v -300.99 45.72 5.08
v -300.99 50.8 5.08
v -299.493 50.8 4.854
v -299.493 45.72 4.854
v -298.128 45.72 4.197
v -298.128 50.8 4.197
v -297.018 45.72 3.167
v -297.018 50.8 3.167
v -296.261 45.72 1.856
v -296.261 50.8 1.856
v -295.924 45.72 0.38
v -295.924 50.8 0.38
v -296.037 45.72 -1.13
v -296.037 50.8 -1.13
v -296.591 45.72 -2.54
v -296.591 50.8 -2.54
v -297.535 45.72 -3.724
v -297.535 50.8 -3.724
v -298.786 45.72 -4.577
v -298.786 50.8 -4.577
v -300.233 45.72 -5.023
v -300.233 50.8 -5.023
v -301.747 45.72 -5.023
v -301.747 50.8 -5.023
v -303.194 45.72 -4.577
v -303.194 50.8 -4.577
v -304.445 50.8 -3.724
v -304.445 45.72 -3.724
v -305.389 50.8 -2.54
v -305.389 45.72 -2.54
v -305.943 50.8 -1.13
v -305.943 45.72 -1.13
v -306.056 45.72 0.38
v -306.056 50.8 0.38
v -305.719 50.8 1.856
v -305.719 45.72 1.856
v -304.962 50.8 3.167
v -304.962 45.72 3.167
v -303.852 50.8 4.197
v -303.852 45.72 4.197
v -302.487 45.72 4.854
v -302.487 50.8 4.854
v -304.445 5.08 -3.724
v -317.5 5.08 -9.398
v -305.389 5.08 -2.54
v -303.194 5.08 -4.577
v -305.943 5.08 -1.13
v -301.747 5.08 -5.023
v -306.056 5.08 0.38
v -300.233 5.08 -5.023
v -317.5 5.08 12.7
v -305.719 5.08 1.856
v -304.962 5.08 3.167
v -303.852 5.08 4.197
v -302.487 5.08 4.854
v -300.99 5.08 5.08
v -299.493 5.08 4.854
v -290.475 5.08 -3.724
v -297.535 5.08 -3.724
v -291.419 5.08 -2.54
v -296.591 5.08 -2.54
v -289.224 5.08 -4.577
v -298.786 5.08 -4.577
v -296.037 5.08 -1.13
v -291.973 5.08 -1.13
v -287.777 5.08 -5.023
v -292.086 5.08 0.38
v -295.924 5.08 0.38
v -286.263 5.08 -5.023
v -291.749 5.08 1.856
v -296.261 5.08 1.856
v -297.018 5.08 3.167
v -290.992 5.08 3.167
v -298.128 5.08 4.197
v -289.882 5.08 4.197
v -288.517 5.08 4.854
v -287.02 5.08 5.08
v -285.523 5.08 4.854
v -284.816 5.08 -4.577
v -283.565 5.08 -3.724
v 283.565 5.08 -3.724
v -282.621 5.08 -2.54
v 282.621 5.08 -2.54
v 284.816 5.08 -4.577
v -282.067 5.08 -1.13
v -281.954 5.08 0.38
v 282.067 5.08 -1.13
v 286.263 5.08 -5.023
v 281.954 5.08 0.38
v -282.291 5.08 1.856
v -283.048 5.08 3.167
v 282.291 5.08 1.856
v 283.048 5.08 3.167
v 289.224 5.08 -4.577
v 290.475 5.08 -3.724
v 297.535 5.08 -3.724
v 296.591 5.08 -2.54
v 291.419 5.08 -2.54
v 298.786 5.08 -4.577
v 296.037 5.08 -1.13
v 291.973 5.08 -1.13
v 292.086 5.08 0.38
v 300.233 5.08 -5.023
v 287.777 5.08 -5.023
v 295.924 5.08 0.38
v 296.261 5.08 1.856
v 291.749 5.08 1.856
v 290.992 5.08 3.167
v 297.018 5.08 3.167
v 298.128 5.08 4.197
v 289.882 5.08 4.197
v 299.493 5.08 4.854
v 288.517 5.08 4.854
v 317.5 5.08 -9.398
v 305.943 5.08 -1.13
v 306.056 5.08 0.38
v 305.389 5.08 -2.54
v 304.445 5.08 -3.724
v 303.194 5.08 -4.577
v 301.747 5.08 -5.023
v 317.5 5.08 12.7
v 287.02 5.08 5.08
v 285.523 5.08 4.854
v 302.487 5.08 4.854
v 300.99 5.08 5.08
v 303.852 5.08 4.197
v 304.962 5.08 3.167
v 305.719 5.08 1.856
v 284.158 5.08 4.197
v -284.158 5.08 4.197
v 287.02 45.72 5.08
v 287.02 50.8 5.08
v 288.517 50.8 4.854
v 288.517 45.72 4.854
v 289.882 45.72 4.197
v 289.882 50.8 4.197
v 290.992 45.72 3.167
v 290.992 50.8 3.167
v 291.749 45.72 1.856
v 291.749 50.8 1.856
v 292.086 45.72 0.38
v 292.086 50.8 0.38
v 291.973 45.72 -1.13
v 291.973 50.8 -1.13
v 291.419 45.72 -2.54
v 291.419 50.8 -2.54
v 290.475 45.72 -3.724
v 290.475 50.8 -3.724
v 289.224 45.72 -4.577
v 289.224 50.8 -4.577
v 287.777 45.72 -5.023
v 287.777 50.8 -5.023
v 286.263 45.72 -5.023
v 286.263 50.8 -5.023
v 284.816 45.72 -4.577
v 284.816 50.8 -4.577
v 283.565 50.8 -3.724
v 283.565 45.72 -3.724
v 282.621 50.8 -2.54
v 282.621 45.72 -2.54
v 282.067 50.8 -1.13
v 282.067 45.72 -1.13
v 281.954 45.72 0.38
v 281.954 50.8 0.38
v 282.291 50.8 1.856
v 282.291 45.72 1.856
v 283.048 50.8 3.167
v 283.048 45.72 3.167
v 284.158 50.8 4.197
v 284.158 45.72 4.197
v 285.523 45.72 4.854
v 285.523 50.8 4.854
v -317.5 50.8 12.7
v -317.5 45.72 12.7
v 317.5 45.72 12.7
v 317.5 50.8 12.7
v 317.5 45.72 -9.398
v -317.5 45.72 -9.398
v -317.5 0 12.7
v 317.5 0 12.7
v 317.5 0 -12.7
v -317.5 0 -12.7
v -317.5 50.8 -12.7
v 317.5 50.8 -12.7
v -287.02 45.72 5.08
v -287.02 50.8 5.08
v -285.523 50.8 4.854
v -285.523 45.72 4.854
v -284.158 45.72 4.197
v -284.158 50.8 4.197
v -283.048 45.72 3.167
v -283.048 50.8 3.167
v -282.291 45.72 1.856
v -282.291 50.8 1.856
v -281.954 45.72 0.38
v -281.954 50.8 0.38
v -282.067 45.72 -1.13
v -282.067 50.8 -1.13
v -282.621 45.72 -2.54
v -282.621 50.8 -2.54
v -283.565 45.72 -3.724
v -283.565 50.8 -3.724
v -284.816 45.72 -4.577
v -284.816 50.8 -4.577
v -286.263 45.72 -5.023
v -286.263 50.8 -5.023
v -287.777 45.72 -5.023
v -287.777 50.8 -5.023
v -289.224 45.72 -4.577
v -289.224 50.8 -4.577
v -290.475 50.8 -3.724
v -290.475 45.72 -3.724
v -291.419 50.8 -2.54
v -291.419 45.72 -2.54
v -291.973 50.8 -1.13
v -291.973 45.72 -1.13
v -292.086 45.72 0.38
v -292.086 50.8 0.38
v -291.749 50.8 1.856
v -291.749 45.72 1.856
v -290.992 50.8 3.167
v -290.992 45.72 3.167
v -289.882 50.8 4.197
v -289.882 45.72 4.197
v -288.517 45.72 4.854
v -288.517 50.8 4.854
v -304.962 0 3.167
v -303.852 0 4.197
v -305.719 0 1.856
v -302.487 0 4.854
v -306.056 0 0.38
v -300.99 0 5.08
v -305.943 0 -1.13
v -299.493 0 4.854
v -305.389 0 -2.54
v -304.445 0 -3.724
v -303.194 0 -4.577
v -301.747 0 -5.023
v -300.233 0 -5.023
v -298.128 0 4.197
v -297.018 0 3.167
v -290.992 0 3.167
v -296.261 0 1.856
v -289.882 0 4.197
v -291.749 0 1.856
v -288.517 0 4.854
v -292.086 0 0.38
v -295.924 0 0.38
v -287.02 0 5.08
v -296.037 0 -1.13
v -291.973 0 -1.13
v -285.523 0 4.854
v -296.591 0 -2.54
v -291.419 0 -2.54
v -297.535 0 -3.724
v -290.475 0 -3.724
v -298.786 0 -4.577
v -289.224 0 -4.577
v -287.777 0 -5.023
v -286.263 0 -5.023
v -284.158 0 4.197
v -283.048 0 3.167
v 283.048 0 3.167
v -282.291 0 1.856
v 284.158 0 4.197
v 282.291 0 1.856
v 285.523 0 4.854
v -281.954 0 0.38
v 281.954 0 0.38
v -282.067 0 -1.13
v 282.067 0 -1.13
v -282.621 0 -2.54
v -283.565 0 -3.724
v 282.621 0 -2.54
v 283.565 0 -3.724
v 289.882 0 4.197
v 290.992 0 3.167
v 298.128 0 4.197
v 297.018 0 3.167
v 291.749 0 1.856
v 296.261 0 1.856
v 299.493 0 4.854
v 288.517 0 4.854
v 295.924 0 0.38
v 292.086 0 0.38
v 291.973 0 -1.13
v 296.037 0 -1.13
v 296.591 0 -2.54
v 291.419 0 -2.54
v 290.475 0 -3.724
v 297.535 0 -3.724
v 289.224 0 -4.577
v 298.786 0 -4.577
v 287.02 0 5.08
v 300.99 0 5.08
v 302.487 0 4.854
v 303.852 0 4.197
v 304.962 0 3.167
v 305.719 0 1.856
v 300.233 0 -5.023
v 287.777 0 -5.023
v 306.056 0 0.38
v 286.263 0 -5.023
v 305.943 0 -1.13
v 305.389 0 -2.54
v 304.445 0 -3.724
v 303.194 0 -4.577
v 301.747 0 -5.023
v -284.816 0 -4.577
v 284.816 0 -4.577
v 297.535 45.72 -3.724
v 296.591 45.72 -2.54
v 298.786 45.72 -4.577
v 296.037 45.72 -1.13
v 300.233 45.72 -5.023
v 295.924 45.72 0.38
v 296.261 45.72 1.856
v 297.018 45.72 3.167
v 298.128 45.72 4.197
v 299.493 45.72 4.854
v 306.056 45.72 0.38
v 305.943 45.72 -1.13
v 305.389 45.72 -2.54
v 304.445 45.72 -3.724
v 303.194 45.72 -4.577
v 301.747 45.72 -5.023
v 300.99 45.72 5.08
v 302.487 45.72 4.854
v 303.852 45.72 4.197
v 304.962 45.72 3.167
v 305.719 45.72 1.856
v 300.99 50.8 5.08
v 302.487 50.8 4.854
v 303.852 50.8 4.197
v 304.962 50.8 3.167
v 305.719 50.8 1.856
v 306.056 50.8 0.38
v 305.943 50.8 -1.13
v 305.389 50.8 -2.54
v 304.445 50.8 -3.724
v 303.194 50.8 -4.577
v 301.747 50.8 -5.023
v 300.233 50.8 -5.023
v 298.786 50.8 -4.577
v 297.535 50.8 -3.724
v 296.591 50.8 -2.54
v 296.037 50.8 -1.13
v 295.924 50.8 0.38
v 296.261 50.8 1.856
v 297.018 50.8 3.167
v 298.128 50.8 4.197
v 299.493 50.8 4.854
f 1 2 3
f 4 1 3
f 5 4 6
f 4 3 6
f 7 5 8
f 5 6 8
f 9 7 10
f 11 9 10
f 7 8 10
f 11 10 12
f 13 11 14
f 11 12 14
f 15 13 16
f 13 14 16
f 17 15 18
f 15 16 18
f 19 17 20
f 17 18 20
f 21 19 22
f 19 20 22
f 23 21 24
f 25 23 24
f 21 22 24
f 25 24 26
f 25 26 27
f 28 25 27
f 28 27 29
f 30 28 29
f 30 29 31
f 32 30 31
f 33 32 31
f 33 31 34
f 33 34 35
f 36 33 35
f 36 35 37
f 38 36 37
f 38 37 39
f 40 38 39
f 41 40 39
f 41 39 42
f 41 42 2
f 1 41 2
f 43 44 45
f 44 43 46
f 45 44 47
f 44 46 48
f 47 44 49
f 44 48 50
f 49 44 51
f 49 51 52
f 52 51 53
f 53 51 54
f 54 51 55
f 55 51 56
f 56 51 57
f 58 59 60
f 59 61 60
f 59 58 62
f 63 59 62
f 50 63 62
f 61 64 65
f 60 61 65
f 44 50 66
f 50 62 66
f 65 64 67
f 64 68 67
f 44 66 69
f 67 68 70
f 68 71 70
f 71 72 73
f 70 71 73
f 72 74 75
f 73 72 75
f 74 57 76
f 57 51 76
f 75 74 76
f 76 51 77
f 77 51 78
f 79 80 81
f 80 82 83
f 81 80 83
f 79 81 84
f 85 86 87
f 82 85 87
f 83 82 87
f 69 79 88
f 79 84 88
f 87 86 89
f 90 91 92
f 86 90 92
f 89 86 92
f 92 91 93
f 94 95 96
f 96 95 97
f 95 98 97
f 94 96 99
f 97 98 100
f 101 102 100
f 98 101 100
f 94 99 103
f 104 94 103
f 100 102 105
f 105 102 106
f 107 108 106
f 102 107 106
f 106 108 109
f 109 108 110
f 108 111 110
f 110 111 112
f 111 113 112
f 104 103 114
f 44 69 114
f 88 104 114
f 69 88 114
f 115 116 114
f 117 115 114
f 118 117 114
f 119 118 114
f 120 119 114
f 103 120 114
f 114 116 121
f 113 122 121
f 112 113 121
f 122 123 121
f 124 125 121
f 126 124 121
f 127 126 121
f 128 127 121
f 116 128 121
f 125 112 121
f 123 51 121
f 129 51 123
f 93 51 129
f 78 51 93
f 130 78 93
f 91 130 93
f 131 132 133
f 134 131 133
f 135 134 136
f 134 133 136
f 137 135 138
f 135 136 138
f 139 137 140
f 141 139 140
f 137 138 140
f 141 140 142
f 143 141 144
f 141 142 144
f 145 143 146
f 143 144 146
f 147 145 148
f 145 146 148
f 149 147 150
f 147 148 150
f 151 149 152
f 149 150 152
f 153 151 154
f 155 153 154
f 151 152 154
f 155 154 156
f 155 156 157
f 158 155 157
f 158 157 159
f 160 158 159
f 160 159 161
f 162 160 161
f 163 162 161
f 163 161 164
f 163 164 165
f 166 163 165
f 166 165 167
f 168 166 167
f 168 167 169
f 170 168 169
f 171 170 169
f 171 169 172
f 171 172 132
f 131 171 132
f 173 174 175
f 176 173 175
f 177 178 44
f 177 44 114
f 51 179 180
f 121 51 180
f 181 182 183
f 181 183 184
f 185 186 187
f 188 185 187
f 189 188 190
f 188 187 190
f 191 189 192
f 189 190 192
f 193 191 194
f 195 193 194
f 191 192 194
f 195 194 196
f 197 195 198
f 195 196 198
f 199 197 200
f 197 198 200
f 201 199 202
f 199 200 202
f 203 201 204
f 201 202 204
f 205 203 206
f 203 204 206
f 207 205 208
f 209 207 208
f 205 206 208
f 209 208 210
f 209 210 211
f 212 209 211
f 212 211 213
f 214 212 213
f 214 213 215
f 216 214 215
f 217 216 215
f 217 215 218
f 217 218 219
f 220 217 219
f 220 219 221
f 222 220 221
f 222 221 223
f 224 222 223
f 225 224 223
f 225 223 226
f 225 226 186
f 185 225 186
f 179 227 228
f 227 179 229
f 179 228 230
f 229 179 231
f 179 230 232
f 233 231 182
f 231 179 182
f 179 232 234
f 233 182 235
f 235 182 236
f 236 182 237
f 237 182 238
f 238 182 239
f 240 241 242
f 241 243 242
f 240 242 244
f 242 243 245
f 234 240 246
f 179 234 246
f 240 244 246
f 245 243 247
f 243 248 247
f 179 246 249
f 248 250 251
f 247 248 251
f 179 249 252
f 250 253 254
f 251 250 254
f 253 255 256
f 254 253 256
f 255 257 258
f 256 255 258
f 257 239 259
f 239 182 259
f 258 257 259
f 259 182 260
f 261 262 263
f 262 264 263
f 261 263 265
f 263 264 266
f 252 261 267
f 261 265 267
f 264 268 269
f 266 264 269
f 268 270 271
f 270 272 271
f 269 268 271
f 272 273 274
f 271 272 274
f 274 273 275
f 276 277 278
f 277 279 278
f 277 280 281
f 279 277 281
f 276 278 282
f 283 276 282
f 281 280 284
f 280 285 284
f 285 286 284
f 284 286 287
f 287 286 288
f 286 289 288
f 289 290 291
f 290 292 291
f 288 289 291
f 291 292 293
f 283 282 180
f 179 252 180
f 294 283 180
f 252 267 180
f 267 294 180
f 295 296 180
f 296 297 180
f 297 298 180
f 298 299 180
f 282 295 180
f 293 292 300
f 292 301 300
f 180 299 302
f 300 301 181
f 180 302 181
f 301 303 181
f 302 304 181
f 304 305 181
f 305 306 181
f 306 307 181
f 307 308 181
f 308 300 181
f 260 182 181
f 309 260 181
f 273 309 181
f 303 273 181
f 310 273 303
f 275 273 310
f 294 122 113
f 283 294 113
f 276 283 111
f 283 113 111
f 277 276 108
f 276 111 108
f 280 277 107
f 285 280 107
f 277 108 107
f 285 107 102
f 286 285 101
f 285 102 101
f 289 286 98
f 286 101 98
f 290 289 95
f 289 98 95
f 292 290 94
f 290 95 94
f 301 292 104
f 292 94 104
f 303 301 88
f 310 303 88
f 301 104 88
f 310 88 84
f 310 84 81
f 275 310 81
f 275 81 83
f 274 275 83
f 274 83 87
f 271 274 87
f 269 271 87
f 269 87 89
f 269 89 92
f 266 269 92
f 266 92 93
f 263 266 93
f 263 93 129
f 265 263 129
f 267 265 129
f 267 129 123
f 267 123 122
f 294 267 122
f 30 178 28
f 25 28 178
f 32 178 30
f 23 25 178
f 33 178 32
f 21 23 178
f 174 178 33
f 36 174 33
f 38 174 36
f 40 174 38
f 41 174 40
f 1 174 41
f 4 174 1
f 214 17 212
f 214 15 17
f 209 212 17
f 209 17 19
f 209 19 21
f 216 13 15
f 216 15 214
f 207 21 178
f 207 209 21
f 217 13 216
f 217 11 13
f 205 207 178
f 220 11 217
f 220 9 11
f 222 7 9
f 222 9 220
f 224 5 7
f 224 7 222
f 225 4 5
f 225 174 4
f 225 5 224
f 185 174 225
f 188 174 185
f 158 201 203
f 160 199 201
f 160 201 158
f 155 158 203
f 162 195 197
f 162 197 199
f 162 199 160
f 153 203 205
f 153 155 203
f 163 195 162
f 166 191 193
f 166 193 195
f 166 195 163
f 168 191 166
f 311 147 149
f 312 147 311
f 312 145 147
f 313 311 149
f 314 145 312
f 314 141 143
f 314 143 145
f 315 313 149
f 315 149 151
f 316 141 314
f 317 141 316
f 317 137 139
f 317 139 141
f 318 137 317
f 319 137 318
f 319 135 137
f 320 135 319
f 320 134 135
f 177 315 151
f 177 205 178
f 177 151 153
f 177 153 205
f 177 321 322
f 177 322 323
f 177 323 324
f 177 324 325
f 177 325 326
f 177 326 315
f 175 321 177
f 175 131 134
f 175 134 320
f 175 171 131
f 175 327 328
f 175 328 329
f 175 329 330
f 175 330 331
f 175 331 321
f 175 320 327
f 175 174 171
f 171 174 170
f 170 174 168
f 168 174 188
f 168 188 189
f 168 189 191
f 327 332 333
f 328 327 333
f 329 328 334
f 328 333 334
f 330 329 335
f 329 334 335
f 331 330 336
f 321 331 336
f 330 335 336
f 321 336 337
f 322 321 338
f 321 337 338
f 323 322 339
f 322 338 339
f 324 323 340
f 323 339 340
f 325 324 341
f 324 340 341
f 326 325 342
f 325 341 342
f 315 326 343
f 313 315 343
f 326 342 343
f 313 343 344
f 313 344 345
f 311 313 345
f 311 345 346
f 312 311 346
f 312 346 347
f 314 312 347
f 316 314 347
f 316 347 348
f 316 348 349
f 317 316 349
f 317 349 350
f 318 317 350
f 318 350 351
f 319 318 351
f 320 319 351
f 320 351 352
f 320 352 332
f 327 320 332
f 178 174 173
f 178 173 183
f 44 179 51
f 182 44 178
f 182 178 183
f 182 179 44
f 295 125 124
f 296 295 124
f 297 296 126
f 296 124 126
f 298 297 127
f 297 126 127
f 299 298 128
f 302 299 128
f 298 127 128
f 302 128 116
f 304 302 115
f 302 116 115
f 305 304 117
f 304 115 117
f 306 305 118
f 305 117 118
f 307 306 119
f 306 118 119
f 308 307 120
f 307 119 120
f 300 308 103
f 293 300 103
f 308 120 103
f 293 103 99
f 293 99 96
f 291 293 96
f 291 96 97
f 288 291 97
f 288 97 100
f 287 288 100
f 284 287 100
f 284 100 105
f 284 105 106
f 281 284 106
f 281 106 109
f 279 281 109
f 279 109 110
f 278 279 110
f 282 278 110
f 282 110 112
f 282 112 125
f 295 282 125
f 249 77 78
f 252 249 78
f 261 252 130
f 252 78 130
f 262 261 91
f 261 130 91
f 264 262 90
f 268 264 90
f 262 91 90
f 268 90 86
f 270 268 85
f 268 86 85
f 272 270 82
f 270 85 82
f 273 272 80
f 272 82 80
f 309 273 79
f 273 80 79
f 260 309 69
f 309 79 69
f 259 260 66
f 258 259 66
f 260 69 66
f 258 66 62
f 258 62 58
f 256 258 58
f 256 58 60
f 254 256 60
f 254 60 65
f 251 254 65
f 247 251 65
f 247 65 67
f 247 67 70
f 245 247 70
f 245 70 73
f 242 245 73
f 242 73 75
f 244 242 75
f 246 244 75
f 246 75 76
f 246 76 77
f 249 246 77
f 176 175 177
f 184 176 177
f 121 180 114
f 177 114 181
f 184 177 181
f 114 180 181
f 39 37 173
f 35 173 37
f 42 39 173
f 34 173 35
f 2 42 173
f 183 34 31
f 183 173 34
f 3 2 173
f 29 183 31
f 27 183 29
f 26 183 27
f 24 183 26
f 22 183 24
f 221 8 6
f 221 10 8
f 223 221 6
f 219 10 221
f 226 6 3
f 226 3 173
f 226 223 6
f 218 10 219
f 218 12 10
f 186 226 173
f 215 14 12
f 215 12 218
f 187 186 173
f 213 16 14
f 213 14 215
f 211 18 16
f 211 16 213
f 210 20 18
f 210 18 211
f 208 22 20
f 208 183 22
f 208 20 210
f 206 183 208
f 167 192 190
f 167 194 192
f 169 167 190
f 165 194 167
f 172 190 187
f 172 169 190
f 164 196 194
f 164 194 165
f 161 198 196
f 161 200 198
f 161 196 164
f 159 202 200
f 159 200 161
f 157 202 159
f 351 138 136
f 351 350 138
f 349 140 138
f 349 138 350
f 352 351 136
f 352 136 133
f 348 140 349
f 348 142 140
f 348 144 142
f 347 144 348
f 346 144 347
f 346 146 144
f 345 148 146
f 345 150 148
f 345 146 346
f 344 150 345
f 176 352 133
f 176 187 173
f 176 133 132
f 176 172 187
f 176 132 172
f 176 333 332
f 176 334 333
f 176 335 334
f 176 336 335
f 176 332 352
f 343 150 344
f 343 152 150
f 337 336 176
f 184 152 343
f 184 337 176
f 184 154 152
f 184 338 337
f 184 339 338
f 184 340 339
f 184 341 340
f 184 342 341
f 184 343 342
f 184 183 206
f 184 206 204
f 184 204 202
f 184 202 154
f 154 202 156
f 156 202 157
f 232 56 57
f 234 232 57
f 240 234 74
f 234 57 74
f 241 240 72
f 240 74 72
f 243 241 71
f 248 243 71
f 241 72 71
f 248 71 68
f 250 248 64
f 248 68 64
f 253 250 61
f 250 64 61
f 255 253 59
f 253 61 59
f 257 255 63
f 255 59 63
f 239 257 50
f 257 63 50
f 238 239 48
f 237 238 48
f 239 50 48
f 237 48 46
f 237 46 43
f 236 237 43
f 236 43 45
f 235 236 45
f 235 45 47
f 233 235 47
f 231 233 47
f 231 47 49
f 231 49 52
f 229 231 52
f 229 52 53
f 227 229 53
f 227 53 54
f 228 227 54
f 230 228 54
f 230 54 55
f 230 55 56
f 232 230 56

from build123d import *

# Parameters (mm, degrees)
SKETCH1_W           = 635
SKETCH1_H           = 25.4
BOSS_EXTRUDE1_DEPTH = 50.8
SKETCH2_R           = 5.08
CUT_EXTRUDE1_DEPTH  = 53.34
SKETCH3_W           = 635
SKETCH3_H           = 40.64
CUT_EXTRUDE2_DEPTH  = 22.098


with BuildPart() as part:
    # Sketch1 → Boss-Extrude1 (new body)
    with BuildSketch(Plane(origin=(0, 0, 0), x_dir=(1, 0, 0), z_dir=(0, 1, 0))):
        Rectangle(SKETCH1_W, SKETCH1_H)
    extrude(amount=BOSS_EXTRUDE1_DEPTH)

    # Sketch2 → Cut-Extrude1 (cut)
    with BuildSketch(Plane(origin=(0, 50.8, 0), x_dir=(1, 0, 0), z_dir=(0, 1, 0))):
        with Locations(Location((-300.99, 0, 0), (0, 0, 270))):
            Circle(SKETCH2_R)
        with Locations(Location((-287.02, 0, 0), (0, 0, 270))):
            Circle(SKETCH2_R)
        with Locations(Location((300.99, 0, 0), (0, 0, 270))):
            Circle(SKETCH2_R)
        with Locations(Location((287.02, 0, 0), (0, 0, 270))):
            Circle(SKETCH2_R)
    extrude(amount=-CUT_EXTRUDE1_DEPTH, mode=Mode.SUBTRACT)

    # Sketch3 → Cut-Extrude2 (cut)
    with BuildSketch(Plane.XY.offset(12.7)):
        with Locations((0, 25.4)):
            Rectangle(SKETCH3_W, SKETCH3_H)
    extrude(amount=-CUT_EXTRUDE2_DEPTH, mode=Mode.SUBTRACT)


solid = part.part
